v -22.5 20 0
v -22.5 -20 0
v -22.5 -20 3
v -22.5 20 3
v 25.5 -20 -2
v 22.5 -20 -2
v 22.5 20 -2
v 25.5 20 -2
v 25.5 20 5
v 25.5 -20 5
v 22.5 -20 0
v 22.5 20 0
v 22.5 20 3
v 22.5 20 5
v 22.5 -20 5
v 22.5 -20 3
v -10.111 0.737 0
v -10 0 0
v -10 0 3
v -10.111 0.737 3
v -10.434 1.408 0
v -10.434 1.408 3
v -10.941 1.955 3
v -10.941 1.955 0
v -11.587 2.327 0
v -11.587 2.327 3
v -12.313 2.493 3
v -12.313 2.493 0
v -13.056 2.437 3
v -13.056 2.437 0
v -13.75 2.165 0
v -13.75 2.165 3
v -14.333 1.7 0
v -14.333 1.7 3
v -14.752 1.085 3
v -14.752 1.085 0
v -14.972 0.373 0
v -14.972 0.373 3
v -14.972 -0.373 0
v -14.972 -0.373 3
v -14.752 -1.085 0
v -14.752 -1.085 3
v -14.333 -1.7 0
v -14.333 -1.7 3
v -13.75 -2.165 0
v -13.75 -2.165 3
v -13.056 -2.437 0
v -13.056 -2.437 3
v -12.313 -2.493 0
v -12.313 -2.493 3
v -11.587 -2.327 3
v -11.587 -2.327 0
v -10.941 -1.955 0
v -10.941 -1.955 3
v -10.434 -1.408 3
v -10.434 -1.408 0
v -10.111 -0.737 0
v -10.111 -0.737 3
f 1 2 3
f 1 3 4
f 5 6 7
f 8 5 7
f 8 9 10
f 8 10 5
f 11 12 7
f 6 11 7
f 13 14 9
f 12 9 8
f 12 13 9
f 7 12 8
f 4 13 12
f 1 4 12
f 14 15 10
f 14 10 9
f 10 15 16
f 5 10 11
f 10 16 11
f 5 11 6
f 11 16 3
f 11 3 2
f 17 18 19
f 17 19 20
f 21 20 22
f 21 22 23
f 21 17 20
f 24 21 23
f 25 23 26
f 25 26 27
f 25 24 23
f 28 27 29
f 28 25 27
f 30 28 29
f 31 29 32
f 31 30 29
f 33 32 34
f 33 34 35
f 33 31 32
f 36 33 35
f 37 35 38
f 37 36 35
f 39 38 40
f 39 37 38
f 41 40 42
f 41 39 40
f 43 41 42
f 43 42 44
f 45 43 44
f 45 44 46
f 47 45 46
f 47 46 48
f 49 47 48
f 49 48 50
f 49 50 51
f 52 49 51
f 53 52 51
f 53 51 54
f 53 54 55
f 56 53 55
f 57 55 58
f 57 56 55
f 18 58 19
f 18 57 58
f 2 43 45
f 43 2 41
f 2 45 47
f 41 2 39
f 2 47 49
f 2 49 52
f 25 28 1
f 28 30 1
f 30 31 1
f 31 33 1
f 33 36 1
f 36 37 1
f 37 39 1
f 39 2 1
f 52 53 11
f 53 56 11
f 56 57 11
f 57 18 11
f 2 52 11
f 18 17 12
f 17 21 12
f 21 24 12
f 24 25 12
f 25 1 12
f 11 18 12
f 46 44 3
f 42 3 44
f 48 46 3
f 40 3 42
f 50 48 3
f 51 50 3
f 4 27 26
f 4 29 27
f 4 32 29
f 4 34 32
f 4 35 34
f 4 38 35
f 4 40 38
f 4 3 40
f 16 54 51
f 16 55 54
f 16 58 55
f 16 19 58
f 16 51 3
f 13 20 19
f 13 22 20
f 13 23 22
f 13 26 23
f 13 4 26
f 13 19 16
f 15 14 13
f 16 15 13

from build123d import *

# Parameters (mm, degrees)
SKETCH_1_W      = 45
SKETCH_1_H      = 40
SKETCH_1_R      = 2.5
EXTRUDE_1_DEPTH = 3
EXTRUDE_START   = 22.5
SKETCH_2_W      = 7
SKETCH_2_H      = 40
EXTRUDE_2_DEPTH = 3


with BuildPart() as part:
    # 草圖1 → 填料-伸長1 (new body)
    with BuildSketch(Plane.XY):
        Rectangle(SKETCH_1_W, SKETCH_1_H)
        with Locations((-12.5, 0)):
            Circle(SKETCH_1_R, mode=Mode.SUBTRACT)
    extrude(amount=EXTRUDE_1_DEPTH)

    # 草圖2 → 填料-伸長2 (add)
    with BuildSketch(Plane(origin=(0, 0, 0), x_dir=(0, 0, -1), z_dir=(1, 0, 0)).offset(EXTRUDE_START)):
        with Locations((-1.5, 0)):
            Rectangle(SKETCH_2_W, SKETCH_2_H)
    extrude(amount=EXTRUDE_2_DEPTH)


solid = part.part
